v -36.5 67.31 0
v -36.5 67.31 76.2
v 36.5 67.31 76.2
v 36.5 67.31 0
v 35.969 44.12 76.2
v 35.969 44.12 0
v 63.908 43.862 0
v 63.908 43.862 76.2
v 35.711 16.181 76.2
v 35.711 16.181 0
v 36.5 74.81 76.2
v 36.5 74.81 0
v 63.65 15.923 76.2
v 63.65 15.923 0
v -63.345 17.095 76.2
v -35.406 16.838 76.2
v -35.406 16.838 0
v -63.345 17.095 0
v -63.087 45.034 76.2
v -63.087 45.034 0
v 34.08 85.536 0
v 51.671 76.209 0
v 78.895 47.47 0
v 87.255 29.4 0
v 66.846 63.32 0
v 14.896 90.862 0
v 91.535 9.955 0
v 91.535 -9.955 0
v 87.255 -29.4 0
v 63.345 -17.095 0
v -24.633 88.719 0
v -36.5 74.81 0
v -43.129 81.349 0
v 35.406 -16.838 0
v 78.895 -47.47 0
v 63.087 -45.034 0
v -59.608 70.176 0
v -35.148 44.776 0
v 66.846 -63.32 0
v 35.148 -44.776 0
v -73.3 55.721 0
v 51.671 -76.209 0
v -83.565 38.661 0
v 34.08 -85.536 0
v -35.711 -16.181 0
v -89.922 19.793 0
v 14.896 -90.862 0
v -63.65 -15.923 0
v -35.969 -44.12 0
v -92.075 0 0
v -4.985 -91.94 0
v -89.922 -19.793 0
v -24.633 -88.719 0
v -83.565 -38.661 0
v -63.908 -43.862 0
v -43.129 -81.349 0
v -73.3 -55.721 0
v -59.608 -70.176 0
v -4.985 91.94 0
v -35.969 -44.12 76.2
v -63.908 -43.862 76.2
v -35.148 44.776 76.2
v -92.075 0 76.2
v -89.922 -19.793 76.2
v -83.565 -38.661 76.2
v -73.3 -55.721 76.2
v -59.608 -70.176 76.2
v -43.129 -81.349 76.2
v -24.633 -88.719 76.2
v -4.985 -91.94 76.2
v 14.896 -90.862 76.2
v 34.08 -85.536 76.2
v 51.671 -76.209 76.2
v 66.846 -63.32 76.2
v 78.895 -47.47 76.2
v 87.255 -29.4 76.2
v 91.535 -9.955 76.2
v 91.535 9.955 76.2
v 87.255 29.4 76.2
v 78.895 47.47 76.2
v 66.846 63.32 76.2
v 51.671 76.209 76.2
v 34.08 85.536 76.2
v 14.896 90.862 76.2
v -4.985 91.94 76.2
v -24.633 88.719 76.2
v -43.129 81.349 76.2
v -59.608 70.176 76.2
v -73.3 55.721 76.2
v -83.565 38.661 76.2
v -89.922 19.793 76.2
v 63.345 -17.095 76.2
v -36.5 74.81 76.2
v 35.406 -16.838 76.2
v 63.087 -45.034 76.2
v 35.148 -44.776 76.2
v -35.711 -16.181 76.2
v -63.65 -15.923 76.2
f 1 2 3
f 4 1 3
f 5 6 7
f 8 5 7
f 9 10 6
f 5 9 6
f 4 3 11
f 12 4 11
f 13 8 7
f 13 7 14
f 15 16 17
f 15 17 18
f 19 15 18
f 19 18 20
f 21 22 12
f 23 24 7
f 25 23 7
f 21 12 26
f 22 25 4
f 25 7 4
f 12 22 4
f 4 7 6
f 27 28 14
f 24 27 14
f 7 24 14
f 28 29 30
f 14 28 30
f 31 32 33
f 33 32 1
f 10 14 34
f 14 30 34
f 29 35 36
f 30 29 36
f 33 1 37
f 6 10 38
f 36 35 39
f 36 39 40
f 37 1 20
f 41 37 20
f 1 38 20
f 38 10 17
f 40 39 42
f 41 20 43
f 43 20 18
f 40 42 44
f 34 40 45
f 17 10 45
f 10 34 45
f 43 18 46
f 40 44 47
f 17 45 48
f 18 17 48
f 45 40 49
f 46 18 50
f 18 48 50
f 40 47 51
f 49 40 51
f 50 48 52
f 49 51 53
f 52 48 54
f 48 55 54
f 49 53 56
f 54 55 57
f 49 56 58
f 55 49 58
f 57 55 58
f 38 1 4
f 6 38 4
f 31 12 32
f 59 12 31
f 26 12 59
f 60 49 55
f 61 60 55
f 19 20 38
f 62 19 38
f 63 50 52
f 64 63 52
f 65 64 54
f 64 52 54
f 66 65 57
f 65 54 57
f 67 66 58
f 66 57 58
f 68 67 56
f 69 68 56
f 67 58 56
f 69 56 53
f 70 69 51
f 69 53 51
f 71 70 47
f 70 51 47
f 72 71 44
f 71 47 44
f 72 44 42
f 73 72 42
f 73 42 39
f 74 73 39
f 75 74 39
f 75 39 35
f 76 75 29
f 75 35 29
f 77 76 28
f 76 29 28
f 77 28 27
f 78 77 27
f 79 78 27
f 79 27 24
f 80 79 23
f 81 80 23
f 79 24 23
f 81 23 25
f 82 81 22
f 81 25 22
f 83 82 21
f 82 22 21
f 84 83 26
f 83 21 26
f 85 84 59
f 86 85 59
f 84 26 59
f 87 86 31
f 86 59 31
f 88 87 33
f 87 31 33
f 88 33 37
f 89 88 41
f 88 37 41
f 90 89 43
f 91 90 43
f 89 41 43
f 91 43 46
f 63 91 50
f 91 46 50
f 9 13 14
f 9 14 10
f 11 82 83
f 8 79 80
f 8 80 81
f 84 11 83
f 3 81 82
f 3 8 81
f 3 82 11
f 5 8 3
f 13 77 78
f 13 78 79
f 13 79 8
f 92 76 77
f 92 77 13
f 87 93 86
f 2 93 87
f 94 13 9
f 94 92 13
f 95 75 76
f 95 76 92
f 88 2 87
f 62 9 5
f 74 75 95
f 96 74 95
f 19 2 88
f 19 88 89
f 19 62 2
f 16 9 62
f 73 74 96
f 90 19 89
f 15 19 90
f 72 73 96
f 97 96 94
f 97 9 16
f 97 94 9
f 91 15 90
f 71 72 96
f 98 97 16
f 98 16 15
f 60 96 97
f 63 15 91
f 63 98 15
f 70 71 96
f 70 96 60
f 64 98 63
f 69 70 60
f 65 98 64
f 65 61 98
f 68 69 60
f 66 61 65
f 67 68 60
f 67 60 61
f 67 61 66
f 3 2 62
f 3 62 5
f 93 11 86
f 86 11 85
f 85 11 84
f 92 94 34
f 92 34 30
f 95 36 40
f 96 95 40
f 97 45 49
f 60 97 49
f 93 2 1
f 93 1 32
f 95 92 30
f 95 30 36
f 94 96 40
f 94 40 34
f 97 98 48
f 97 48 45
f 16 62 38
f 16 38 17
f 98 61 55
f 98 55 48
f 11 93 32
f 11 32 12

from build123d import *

# Parameters (mm, degrees)
SKETCH1_R           = 92.075
BOSS_EXTRUDE1_DEPTH = 76.2
CUT_EXTRUDE3_DEPTH  = 76.2
SKETCH8_W           = 73
SKETCH8_H           = 7.5
CUT_EXTRUDE4_DEPTH  = 76.2


with BuildPart() as part:
    # Sketch1 → Boss-Extrude1 (new body)
    with BuildSketch(Plane.XY):
        with Locations(Location((0, 0, 0), (0, 0, 180))):
            Circle(SKETCH1_R)
    extrude(amount=BOSS_EXTRUDE1_DEPTH)

    # Sketch7 → Cut-Extrude3 (cut)
    with BuildSketch(Plane(origin=(0, 0, 0), x_dir=(-1, 0, 0), z_dir=(0, 0, -1))):
        Polygon((35.148231052, 44.776310186), (35.406105201, 16.837500245), (63.344915142, 17.095374394), (63.087040993, 45.034184335), align=None)
        Polygon((63.649675499, -15.923219173), (35.710865558, -16.181093322), (35.968739707, -44.119903263), (63.907549648, -43.862029114), align=None)
        Polygon((-35.148231052, -44.776310186), (-35.406105201, -16.837500245), (-63.344915142, -17.095374394), (-63.087040993, -45.034184335), align=None)
        Polygon((-63.649675499, 15.923219173), (-35.710865558, 16.181093322), (-35.968739707, 44.119903263), (-63.907549648, 43.862029114), align=None)
    extrude(amount=-CUT_EXTRUDE3_DEPTH, mode=Mode.SUBTRACT)

    # Sketch8 → Cut-Extrude4 (cut)
    with BuildSketch(Plane.XY.offset(76.2)):
        with Locations((0, 71.06)):
            Rectangle(SKETCH8_W, SKETCH8_H)
    extrude(amount=-CUT_EXTRUDE4_DEPTH, mode=Mode.SUBTRACT)


solid = part.part
